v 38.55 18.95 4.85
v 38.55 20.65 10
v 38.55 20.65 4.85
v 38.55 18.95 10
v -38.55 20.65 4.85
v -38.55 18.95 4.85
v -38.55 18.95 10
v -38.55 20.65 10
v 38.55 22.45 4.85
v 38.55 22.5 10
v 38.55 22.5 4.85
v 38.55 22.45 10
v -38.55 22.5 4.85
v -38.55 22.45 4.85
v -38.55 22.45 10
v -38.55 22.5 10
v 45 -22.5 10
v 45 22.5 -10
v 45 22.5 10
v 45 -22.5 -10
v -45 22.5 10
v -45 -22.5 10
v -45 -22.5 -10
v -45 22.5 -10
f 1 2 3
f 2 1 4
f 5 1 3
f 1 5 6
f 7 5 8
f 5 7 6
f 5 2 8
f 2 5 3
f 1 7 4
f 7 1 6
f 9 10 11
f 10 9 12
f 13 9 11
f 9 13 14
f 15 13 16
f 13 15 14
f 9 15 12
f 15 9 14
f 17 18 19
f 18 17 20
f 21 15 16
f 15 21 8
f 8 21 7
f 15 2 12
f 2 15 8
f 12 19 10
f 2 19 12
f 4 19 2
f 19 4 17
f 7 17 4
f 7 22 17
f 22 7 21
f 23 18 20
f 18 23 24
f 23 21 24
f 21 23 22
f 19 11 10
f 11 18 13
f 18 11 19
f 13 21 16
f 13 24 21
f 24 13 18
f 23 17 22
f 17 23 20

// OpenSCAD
// Dimensions in millimetres
block_length = 90;      // X dimension
block_width = 45;       // Y dimension
block_height = 20;      // Z dimension

slide_length = 75;      // Length of the slide
slide_width = 25;       // Width of the slide
slide_thickness = 1;    // Thickness of the slide

slot_length = 77;       // Length of the slot (slightly shorter than block to allow for walls)
slot_width = 1.6;       // Width of the slot
slot_depth = 10;        // Depth of the slot (how deep the cut is)
slot_spacing = 3.5;     // Centre-to-centre distance between slots

// Derived dimensions
// Calculate the number of slots that fit within the block width
// We use a for loop to determine the exact count based on spacing
num_slots = 0;
for (i = [0 : 1]) {
    if ((i * slot_spacing) + (slot_width / 2) < (block_width / 2)) {
        num_slots = i + 1;
    }
}

// Calculate the total width occupied by the slots
total_slot_width = (num_slots * slot_width) + ((num_slots - 1) * slot_spacing);

// Calculate the offset to center the group of slots
slot_offset = (block_width - total_slot_width) / 2;

$fn = 64;

module base_block() {
    cube([block_length, block_width, block_height], center=true);
}

module slot_cutout() {
    // The slot is a rectangular prism cut into the top face
    // We extend it slightly past the block faces to ensure clean cuts
    // We translate by block_width/2 to ensure the cutout is relative to the block's center
    translate([0, block_width/2, block_height - slot_depth - 0.1])
    cube([slot_length + 0.1, slot_width + 0.1, slot_depth + 0.1], center=true);
}

module drying_rack() {
    difference() {
        base_block();
        
        // Create the slots
        for (i = [0 : num_slots - 1]) {
            // Calculate Y position for each slot
            y_pos = (i * slot_spacing) + (slot_width / 2);
            
            translate([0, y_pos, 0])
            slot_cutout();
        }
    }
}

// Render the part
drying_rack();
